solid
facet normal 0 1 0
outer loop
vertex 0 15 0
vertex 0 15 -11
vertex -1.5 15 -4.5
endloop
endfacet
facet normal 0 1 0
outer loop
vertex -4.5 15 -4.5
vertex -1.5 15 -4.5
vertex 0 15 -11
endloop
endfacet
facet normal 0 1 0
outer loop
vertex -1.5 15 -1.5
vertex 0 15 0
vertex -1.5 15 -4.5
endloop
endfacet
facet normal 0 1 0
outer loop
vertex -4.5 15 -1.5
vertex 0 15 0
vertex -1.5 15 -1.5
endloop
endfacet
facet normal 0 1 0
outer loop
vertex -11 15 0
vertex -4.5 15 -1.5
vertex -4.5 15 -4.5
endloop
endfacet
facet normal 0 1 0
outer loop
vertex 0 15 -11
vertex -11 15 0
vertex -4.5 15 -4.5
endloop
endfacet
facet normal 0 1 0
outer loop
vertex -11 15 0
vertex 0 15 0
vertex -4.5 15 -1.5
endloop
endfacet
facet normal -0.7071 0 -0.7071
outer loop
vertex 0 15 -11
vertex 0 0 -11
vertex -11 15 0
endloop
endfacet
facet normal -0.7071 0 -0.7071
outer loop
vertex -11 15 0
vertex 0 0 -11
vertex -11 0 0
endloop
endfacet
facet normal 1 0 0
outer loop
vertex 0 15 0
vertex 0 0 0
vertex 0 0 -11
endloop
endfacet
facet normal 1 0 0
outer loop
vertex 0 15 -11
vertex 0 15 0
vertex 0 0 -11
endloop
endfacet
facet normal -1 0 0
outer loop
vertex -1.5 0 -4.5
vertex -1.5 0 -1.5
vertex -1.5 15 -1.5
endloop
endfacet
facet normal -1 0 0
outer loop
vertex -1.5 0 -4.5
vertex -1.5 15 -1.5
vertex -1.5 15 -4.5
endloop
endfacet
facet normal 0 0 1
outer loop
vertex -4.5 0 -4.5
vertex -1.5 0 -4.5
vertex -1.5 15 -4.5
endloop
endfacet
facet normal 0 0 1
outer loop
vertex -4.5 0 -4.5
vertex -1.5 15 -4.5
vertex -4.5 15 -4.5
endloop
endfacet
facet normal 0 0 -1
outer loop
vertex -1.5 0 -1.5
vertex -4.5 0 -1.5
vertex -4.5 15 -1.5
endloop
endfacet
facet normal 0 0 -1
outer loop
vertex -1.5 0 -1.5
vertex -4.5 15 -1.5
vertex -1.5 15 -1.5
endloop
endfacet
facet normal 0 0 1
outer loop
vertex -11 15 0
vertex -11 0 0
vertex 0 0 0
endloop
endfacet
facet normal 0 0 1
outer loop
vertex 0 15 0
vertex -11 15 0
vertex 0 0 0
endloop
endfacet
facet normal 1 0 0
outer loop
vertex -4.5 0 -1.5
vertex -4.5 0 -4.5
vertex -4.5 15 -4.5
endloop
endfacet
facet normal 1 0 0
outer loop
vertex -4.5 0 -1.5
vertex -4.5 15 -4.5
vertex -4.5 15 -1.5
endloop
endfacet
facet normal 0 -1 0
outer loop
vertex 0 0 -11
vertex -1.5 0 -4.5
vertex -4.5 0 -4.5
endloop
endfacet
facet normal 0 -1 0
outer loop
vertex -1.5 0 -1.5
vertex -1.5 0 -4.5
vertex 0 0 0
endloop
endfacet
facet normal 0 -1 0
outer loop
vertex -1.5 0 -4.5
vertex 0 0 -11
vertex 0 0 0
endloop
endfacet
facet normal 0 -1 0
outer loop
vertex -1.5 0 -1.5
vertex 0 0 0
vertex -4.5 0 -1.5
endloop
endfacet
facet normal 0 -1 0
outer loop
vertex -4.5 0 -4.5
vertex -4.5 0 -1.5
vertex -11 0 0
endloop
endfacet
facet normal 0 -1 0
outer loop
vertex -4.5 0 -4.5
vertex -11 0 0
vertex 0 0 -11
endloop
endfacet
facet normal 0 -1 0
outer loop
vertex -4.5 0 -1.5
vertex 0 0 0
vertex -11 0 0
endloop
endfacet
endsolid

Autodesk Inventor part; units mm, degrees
ref_plane "YZ Plane" through (0, 0, 0) normal (1, 0, 0) x (0, 1, 0)
ref_plane "XZ Plane" through (0, 0, 0) normal (0, 1, 0) x (-1, 0, 0)
ref_plane "XY Plane" through (0, 0, 0) normal (0, 0, 1) x (1, 0, 0)
sketch "草圖1" plane through (0, 0, 0) normal (0, 1, 0) x (-1, 0, 0)
  line L0 (0, 0) -> (0, -11)
  line L1 (0, -11) -> (11, 0)
  line L2 (11, 0) -> (0, 0)
  line L3 (4.5, -1.5) -> (1.5, -1.5)
  line L4 (1.5, -1.5) -> (1.5, -4.5)
  line L5 (1.5, -4.5) -> (4.5, -4.5)
  line L6 (4.5, -4.5) -> (4.5, -1.5)
  dimension "d0" = 11
  dimension "d1" = 11
  dimension "d4" = 3
  dimension "d5" = 3
  dimension "d8" = 1.5
  dimension "d9" = 1.5
extrude "擠出1" add sketch "草圖1" along normal blind 15
properties part number "triangle"
